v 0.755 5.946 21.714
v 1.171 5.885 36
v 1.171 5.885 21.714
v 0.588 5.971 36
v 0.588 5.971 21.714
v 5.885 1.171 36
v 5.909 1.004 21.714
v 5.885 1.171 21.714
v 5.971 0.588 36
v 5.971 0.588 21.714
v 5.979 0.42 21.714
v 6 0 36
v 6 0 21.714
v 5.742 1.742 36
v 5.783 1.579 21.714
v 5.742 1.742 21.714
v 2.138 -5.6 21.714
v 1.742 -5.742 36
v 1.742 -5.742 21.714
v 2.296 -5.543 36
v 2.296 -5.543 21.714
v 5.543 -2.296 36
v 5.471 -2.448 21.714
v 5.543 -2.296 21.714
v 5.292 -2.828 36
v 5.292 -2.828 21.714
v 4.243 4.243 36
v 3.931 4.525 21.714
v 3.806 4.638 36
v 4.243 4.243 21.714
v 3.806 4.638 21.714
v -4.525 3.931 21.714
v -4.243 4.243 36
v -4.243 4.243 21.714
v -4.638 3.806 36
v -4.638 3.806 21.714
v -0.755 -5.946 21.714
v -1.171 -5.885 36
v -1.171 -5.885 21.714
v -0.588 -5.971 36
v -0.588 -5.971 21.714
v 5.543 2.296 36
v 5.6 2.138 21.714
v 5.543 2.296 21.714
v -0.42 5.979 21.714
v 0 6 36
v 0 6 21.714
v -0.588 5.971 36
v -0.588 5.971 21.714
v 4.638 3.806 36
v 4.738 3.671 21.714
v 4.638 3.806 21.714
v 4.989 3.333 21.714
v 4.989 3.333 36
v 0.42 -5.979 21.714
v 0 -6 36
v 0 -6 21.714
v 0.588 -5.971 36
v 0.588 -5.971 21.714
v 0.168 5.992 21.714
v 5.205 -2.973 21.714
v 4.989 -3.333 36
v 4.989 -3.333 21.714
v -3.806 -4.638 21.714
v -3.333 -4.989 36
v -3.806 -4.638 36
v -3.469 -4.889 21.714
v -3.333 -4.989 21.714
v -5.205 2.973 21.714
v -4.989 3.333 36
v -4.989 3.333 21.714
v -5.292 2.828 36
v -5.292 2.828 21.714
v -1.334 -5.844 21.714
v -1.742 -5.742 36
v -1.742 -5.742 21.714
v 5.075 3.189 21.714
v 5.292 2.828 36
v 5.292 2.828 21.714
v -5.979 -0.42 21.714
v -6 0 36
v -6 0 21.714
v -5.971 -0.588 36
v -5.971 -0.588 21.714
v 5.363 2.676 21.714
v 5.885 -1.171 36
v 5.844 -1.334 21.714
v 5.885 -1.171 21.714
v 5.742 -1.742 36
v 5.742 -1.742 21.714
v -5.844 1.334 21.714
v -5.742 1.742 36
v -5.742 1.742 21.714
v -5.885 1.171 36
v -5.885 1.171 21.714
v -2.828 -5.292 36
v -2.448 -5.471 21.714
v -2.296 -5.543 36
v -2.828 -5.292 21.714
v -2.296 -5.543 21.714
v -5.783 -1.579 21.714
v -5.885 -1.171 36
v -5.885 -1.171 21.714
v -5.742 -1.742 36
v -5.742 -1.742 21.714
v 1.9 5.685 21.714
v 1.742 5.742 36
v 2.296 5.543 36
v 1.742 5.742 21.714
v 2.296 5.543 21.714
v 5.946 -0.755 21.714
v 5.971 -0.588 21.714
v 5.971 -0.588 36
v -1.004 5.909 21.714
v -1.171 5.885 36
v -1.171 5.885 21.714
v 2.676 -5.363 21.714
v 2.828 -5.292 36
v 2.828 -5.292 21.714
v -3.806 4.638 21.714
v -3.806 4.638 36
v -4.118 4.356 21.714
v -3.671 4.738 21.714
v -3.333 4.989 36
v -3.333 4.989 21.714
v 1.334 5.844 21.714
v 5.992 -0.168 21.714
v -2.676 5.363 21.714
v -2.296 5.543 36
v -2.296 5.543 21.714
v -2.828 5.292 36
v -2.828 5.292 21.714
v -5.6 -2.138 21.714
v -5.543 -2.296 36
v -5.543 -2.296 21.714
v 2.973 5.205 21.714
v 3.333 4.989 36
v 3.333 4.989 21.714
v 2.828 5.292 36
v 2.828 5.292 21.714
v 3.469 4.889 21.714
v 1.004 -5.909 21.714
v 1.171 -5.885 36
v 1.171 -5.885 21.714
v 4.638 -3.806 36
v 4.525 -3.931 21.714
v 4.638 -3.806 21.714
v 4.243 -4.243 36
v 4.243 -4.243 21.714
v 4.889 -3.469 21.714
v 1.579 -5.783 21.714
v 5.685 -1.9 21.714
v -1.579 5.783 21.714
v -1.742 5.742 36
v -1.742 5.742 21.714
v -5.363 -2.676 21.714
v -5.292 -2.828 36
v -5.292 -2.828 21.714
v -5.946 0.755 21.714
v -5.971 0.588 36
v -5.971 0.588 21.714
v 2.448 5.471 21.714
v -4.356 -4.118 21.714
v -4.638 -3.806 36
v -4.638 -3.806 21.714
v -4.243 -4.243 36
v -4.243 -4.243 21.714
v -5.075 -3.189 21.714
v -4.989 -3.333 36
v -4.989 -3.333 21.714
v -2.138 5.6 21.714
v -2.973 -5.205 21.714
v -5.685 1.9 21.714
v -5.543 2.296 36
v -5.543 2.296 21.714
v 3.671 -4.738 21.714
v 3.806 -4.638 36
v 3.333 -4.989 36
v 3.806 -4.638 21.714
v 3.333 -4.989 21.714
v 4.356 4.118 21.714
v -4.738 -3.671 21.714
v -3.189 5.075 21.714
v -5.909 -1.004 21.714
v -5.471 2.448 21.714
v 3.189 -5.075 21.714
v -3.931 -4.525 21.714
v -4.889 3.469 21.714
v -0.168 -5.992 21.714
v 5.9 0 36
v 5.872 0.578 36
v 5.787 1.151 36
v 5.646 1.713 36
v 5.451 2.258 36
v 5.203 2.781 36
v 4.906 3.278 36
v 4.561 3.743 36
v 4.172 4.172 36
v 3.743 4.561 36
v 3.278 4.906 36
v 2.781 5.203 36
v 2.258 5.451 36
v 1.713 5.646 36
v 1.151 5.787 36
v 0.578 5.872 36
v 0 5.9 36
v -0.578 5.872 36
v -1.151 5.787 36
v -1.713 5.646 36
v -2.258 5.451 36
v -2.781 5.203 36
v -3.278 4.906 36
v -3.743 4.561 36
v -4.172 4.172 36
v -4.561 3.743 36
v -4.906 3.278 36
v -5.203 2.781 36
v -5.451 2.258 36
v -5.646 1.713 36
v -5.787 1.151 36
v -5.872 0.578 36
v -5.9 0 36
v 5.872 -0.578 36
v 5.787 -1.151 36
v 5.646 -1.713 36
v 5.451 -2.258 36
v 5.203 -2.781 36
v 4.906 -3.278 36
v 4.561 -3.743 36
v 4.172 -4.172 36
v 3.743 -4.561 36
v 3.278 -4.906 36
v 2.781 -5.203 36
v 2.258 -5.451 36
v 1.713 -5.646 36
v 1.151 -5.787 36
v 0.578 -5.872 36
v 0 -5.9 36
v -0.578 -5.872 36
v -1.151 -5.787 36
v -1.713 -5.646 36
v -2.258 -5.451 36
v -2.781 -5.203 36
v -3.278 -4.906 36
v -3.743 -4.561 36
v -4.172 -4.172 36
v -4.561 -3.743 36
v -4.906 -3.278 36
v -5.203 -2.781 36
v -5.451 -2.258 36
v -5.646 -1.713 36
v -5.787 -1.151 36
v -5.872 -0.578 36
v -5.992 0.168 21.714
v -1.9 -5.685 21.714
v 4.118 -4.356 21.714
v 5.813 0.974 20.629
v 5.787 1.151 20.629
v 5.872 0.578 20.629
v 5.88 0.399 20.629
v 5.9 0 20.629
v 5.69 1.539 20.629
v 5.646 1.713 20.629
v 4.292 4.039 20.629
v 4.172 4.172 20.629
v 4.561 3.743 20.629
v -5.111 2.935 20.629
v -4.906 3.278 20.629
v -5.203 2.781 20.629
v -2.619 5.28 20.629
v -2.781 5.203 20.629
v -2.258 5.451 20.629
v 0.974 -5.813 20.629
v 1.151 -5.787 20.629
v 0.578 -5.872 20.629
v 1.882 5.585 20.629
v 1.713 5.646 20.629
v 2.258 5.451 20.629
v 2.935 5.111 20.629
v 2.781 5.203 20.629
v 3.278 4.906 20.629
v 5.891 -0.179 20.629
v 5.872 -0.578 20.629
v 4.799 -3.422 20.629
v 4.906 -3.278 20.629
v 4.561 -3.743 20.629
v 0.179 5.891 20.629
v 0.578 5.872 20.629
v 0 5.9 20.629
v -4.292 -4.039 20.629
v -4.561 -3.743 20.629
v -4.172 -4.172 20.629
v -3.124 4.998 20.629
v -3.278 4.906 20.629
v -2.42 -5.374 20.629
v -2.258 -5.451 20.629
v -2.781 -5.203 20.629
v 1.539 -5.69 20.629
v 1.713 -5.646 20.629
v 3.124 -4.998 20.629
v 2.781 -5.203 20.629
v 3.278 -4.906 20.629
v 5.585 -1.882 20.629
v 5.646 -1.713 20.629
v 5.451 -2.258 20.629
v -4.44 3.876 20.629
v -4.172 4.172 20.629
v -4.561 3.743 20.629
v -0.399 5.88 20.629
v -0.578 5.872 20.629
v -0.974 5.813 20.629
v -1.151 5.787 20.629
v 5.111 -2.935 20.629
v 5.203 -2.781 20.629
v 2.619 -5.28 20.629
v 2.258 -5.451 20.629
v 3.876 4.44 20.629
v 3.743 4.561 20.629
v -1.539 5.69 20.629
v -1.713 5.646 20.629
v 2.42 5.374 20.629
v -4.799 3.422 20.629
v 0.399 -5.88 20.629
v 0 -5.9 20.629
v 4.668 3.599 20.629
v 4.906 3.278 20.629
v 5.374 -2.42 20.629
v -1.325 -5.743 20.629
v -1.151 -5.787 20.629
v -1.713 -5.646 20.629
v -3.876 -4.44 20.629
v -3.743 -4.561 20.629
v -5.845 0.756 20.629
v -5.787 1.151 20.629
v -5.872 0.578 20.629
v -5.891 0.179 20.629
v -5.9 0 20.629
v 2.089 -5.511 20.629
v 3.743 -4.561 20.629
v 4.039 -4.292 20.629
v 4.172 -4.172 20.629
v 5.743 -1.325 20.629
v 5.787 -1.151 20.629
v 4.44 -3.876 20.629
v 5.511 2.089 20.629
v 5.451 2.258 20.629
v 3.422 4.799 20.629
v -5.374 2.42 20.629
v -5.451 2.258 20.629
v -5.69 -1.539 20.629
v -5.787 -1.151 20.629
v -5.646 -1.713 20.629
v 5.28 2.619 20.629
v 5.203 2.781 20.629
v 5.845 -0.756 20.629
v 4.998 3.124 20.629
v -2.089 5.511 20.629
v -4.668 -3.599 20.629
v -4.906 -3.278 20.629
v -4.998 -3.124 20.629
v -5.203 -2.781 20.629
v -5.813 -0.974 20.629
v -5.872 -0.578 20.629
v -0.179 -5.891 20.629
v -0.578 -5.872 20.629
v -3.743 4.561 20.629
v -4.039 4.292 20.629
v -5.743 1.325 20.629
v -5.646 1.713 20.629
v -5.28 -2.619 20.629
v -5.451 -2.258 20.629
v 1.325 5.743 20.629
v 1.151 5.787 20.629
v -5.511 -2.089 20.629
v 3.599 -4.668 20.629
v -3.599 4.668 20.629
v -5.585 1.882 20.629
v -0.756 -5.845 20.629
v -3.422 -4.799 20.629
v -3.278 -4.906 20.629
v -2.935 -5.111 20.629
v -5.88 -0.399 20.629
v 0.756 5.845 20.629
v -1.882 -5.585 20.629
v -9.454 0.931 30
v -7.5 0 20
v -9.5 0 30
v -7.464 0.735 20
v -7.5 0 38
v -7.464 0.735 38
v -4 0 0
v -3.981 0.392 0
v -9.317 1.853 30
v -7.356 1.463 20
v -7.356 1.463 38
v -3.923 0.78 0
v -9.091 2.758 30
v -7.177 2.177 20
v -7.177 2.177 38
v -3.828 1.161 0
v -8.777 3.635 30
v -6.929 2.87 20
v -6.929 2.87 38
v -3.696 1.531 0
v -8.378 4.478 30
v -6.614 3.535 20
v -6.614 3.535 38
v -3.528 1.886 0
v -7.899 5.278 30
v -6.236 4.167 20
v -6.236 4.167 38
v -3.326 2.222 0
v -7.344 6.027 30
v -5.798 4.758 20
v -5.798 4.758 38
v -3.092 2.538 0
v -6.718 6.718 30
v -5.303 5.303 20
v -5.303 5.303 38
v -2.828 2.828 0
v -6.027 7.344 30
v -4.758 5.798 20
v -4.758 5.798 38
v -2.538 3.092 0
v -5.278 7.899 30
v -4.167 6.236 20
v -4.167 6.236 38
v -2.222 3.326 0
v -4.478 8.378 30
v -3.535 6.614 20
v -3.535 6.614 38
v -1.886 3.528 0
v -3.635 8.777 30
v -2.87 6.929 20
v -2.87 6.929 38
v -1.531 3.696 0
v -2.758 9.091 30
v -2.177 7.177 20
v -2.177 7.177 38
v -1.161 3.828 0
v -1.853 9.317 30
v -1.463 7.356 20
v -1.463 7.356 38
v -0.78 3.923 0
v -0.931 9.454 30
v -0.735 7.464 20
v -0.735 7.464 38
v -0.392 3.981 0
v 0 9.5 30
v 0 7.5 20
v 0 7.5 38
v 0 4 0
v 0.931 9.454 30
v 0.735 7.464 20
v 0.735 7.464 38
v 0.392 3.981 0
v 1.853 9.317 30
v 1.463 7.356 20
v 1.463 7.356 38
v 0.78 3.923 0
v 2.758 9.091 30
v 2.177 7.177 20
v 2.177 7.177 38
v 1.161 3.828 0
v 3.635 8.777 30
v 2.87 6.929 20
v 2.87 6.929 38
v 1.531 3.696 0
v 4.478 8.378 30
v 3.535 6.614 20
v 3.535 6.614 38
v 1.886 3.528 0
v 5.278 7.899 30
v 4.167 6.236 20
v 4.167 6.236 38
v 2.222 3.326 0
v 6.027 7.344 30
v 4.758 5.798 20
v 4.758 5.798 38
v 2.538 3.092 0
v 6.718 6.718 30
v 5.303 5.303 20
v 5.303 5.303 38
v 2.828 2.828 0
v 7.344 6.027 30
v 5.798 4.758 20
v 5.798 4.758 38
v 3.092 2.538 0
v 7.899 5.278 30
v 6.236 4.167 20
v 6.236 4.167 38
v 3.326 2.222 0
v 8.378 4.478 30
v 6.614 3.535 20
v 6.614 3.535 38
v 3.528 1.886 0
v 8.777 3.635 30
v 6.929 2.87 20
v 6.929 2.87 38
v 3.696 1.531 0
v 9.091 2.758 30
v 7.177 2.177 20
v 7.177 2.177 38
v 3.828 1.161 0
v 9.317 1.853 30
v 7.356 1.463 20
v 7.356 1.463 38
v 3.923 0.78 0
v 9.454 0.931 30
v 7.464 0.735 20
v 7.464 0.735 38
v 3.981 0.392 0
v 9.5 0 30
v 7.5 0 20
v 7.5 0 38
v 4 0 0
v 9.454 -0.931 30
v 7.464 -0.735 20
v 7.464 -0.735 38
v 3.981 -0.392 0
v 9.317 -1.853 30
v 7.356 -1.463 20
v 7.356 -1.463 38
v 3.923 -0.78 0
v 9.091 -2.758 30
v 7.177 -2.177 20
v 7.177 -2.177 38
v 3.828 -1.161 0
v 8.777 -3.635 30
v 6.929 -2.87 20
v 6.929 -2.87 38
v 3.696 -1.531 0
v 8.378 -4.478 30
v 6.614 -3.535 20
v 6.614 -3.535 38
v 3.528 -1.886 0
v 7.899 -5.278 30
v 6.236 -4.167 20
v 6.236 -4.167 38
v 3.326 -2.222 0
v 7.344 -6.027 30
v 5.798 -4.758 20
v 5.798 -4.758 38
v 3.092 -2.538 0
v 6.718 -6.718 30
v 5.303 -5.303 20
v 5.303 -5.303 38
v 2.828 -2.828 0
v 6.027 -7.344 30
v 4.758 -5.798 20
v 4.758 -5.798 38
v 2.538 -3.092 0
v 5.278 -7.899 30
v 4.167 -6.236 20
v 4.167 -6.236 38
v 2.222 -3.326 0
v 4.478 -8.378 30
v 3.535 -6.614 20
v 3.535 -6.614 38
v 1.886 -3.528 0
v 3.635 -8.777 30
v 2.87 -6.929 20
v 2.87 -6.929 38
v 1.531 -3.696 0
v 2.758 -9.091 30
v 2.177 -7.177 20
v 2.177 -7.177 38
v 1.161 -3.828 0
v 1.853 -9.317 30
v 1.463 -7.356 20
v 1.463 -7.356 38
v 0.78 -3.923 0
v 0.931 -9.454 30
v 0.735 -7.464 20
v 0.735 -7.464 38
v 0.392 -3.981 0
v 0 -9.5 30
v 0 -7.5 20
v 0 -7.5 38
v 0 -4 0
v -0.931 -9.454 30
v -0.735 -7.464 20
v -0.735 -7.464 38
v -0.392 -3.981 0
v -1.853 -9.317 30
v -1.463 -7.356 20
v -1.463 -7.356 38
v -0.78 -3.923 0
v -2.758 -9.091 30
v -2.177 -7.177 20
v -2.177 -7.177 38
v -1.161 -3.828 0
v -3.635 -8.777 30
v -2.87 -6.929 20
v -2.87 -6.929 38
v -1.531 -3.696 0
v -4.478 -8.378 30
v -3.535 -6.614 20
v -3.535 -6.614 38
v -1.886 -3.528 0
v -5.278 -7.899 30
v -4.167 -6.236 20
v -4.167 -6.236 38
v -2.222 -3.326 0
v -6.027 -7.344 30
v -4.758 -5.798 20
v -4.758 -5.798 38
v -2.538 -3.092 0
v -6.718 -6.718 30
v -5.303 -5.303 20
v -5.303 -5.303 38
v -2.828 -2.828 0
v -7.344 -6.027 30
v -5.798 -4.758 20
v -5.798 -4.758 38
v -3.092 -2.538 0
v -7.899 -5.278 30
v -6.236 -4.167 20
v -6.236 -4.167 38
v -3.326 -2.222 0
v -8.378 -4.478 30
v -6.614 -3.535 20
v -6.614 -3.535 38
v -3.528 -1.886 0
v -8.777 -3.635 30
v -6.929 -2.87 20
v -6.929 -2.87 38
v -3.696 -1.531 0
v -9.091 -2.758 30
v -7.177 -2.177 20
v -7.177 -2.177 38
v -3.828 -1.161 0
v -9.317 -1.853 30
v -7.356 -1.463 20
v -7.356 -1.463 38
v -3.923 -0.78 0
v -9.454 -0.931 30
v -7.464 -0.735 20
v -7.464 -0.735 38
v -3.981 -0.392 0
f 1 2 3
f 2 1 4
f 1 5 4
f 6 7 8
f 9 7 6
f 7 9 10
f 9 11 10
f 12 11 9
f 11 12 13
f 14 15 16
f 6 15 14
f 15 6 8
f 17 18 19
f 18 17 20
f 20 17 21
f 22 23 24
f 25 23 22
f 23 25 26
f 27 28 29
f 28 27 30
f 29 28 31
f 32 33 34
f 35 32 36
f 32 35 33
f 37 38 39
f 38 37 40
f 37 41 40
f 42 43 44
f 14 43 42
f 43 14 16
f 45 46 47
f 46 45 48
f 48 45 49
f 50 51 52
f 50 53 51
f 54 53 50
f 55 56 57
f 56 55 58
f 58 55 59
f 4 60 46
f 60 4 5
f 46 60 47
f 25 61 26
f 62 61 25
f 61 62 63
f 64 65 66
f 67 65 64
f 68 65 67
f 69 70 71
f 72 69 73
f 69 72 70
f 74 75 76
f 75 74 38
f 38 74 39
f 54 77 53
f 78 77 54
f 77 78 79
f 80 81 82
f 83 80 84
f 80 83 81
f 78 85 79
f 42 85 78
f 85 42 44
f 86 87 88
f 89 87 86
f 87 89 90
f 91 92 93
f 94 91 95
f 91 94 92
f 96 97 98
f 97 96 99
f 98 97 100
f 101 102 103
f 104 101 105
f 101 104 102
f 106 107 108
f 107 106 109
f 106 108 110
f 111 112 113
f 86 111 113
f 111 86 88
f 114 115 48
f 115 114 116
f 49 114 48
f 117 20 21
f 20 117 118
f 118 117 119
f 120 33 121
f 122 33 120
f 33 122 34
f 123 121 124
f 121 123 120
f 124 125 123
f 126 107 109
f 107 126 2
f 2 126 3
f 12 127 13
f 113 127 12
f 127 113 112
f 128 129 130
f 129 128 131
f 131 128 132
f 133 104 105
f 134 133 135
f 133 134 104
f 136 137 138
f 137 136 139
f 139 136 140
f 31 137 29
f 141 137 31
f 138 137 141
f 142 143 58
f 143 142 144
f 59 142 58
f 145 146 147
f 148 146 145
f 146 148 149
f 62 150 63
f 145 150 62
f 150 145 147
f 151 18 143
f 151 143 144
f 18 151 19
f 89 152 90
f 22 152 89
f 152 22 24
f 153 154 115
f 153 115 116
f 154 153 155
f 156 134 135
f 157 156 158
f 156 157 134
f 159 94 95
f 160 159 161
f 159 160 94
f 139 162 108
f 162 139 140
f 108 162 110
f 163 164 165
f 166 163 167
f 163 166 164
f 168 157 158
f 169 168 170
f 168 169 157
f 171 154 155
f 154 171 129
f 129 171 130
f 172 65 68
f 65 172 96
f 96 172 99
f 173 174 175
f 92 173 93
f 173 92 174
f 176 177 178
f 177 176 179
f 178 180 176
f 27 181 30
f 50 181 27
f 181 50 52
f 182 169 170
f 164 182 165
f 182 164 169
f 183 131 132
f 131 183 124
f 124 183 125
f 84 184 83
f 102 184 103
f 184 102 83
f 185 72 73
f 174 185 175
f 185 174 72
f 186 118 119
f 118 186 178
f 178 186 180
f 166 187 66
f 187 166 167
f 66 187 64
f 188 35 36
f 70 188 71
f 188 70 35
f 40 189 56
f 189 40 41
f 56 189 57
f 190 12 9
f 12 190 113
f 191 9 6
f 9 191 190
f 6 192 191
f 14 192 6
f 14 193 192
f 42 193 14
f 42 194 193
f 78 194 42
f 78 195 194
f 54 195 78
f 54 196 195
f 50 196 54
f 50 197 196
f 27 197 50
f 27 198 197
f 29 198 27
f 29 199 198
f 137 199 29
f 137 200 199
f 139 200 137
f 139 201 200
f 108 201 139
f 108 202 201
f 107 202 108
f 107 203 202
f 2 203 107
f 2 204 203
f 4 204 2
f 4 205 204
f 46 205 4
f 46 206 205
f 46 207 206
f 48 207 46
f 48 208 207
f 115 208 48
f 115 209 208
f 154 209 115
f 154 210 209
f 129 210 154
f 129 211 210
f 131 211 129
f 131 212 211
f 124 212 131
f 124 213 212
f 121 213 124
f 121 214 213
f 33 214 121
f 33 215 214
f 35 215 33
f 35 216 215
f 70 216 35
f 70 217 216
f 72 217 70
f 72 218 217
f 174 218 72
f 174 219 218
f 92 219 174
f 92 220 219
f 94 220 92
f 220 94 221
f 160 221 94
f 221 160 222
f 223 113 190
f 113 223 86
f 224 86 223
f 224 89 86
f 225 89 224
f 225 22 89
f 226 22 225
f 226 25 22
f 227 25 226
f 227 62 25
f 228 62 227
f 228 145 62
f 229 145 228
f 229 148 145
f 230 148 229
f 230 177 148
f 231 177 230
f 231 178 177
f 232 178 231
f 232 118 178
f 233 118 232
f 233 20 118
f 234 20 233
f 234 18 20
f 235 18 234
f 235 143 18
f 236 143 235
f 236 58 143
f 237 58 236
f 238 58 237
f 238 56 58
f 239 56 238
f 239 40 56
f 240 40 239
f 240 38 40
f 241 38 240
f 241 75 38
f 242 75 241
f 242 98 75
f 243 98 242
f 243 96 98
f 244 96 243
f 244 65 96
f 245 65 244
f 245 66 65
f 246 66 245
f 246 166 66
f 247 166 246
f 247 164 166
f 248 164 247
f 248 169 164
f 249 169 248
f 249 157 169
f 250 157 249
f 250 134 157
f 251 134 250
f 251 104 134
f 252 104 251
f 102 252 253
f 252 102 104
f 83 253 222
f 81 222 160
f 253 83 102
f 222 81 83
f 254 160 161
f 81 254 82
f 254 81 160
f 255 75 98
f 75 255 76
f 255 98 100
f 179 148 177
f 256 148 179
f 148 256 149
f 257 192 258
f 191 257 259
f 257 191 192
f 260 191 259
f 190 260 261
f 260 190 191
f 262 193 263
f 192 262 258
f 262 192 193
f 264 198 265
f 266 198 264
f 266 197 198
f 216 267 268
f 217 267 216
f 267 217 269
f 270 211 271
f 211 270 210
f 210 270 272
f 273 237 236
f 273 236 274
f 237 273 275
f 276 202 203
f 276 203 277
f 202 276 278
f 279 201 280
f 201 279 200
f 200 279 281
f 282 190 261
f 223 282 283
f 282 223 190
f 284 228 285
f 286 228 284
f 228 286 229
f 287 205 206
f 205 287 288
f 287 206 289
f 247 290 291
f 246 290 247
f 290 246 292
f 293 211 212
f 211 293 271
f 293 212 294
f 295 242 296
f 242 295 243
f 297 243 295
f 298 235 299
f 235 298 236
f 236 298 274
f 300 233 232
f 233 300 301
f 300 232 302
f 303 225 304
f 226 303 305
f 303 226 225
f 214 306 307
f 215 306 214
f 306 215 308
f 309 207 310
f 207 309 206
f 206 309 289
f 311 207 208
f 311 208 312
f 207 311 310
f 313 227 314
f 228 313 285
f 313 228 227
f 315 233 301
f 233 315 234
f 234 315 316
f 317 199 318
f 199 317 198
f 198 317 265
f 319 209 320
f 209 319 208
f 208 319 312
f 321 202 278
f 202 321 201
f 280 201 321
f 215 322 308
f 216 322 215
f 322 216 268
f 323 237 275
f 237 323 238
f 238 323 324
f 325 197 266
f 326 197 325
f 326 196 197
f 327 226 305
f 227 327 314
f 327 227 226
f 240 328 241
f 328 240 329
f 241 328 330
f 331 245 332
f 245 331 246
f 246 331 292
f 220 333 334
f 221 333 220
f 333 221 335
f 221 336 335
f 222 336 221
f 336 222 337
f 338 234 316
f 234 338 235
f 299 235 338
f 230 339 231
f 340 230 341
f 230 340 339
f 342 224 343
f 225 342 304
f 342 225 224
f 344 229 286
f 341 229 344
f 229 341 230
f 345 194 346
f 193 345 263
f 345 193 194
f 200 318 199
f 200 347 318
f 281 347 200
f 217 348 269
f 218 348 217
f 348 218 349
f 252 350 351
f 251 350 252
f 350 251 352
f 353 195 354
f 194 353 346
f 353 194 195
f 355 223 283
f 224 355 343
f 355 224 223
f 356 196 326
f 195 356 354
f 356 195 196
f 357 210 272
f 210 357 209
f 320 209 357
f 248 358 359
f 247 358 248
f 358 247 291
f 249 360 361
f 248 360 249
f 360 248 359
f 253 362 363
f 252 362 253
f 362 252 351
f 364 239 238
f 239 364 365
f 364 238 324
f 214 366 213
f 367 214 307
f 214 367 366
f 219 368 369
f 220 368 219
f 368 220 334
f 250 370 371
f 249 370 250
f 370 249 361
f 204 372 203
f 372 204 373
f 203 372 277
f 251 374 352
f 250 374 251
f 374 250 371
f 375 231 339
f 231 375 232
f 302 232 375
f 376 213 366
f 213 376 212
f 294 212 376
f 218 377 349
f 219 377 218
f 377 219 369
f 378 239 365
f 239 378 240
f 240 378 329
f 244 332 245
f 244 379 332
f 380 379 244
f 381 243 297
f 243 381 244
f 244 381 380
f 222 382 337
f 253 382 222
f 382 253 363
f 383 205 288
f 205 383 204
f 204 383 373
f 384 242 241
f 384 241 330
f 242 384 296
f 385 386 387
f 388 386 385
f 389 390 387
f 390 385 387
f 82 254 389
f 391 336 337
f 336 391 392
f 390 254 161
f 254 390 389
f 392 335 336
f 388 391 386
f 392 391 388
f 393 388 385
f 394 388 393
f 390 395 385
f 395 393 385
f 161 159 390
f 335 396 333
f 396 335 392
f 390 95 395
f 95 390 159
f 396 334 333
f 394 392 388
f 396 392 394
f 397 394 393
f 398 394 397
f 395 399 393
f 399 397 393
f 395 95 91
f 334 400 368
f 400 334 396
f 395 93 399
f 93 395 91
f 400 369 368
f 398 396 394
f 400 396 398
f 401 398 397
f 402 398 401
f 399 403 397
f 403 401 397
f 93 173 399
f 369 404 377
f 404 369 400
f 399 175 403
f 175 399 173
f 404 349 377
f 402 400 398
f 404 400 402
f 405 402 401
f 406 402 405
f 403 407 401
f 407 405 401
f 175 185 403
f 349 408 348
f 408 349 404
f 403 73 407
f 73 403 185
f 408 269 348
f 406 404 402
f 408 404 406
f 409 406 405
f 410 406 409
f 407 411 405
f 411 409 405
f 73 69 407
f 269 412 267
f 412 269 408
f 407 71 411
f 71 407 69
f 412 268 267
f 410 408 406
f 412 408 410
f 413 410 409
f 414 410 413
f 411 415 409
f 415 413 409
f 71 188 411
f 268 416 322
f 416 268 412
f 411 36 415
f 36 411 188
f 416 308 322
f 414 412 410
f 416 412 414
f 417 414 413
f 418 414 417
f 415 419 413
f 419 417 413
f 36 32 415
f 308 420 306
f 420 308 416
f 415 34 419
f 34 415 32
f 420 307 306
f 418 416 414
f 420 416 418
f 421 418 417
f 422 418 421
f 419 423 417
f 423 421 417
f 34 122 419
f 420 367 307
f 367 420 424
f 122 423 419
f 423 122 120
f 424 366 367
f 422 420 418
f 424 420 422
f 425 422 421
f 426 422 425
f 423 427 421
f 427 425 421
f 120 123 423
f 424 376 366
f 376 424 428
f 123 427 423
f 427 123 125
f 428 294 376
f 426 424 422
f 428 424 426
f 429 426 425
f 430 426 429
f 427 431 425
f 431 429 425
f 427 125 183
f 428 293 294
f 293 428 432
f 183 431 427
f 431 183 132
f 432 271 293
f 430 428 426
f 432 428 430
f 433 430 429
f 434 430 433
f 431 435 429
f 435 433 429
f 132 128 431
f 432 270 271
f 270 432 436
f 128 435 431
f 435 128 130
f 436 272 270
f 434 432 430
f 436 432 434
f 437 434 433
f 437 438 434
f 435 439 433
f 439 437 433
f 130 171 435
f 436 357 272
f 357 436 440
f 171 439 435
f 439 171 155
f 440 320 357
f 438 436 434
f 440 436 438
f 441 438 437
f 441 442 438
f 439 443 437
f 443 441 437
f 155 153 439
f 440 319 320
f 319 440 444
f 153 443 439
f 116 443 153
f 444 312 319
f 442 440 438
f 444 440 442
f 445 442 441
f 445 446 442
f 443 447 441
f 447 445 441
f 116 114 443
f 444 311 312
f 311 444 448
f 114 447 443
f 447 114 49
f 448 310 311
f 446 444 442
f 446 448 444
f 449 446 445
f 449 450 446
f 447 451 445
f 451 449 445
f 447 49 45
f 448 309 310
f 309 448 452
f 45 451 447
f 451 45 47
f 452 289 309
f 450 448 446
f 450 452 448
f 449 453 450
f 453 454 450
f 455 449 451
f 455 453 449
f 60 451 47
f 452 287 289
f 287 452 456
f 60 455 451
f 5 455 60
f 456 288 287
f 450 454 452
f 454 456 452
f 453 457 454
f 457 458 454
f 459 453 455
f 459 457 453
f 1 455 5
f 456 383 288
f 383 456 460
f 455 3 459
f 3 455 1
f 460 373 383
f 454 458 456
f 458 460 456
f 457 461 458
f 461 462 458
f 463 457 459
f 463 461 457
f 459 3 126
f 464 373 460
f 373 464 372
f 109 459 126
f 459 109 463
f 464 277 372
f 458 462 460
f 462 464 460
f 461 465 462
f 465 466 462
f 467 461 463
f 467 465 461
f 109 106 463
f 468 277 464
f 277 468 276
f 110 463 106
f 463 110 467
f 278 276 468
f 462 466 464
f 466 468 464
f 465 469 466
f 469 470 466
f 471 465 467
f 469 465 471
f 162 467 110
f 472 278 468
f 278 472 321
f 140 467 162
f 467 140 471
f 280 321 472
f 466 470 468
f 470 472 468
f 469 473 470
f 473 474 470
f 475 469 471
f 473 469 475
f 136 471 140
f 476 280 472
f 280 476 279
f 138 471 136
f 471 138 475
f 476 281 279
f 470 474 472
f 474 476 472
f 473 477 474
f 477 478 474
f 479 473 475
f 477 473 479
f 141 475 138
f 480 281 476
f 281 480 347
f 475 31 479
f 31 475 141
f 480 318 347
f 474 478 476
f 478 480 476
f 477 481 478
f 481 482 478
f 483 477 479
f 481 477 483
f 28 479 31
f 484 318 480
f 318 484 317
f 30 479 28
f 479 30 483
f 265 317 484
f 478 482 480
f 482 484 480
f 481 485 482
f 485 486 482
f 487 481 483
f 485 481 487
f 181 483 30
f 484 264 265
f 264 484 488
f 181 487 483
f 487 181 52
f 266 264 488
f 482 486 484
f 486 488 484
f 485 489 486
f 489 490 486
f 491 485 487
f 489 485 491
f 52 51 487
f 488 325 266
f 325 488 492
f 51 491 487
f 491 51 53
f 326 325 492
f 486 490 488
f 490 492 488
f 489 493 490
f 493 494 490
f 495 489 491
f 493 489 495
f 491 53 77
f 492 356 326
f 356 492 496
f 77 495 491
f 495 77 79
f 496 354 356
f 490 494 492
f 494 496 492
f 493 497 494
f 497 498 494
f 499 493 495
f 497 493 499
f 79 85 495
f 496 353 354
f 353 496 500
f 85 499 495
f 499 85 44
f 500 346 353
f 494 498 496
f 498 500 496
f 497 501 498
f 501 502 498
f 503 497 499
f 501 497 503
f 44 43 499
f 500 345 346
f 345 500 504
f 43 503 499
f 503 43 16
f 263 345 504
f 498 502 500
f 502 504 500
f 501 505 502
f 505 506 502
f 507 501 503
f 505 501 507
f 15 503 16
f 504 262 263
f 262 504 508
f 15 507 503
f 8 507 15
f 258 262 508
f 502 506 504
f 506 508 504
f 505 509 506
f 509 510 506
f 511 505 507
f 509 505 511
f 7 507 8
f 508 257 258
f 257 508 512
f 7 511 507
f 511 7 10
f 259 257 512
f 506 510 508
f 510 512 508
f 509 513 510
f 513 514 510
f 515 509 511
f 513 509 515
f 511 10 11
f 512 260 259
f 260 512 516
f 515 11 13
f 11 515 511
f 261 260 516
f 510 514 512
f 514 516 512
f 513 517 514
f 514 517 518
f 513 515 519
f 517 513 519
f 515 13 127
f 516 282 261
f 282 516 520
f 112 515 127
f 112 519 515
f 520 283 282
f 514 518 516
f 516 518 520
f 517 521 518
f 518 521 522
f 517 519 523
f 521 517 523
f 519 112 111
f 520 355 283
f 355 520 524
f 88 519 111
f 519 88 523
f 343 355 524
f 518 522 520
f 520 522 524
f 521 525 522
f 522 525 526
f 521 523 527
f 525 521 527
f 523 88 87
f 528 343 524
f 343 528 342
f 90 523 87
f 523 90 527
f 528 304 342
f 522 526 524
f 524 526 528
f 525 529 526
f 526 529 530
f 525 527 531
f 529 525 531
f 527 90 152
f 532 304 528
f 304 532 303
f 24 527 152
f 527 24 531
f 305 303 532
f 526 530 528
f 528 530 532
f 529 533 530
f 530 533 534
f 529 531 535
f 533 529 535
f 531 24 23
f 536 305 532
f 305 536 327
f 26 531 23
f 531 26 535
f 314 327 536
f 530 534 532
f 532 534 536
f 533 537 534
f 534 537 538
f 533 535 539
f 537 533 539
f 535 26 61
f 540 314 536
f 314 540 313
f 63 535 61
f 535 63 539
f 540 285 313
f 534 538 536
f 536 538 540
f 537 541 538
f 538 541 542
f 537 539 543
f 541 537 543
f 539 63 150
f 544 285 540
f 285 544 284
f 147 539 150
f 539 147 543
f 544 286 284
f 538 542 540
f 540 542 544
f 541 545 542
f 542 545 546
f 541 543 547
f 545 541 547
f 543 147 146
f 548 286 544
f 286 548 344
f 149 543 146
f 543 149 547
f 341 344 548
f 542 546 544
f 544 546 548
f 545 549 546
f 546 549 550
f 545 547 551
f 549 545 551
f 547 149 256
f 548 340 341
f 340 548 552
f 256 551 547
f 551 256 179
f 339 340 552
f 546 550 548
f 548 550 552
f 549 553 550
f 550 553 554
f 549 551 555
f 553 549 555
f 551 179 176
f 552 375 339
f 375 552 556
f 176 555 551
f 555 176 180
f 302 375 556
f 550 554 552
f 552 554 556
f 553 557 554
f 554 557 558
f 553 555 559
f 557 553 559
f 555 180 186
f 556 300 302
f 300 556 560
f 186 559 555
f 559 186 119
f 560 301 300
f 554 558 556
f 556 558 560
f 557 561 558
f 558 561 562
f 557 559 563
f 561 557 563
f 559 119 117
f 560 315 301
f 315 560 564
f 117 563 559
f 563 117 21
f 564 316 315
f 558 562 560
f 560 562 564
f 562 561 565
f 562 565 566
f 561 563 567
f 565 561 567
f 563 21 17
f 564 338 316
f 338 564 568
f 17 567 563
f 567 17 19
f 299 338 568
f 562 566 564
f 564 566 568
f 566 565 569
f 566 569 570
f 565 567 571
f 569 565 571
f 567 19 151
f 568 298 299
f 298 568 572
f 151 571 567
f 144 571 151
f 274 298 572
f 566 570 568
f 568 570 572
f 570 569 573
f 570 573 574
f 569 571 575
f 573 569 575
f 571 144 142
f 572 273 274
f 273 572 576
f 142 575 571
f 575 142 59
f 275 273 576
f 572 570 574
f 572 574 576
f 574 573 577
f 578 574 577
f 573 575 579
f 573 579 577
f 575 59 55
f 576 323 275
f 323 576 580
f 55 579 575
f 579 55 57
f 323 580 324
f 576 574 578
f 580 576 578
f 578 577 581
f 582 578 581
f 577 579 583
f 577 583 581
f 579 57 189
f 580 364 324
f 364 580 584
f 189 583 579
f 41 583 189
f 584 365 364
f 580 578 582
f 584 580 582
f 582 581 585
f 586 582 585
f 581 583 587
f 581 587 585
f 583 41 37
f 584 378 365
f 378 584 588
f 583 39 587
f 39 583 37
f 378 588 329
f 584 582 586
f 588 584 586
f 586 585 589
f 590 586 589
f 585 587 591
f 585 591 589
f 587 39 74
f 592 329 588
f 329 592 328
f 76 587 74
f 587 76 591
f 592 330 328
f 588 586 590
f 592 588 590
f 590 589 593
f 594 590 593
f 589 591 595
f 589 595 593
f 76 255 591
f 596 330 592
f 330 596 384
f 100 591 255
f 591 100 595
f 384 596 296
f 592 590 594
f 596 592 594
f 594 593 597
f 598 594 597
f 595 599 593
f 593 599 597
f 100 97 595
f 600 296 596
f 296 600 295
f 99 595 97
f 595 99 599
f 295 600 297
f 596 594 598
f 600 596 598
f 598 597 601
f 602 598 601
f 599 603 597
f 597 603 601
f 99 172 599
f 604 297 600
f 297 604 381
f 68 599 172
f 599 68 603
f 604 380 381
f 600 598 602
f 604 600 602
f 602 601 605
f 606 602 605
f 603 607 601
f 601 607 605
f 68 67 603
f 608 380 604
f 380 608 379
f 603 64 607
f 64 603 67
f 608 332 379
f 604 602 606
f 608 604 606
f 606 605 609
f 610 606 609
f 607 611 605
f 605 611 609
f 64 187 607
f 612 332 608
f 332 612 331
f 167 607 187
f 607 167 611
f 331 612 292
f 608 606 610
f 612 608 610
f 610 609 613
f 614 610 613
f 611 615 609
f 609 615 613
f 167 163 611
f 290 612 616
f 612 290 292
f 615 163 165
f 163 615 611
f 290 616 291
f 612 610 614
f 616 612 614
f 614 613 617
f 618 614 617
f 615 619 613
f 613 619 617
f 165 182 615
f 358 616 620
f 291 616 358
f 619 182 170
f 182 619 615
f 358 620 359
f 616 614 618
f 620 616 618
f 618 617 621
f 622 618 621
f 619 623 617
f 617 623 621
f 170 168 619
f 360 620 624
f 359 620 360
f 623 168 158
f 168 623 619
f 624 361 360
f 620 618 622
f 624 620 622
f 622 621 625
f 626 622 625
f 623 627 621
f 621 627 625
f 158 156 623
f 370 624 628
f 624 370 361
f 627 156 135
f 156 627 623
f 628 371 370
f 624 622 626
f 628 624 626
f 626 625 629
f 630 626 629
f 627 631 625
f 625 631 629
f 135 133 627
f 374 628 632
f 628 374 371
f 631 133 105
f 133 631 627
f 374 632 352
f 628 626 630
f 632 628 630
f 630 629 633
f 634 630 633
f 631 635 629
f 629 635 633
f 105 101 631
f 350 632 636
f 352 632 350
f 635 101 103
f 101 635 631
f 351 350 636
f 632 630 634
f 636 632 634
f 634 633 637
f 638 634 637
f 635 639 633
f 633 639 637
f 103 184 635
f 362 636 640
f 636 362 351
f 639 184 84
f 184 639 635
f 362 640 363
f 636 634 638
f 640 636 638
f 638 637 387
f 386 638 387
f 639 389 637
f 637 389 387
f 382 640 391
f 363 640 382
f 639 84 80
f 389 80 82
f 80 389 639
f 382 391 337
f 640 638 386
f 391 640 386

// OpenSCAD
// Built by bench/smallmodels/features/compiler.py from a list of features.
$fn = 64;
difference() {
  union() {
    translate([0, 0, 0]) rotate_extrude() polygon([[4, 0], [7.5, 20], [9.5, 30], [7.5, 38]]);
    translate([0, 0, 20]) difference() { cylinder(d = 12, h = 16); translate([0, 0, -0.01]) cylinder(d = 11.8, h = 16.02); }
  }
  union() {
    translate([0, 0, -1]) rotate([0, 0, 0]) cylinder(d = 3, h = 40);
  }
}
